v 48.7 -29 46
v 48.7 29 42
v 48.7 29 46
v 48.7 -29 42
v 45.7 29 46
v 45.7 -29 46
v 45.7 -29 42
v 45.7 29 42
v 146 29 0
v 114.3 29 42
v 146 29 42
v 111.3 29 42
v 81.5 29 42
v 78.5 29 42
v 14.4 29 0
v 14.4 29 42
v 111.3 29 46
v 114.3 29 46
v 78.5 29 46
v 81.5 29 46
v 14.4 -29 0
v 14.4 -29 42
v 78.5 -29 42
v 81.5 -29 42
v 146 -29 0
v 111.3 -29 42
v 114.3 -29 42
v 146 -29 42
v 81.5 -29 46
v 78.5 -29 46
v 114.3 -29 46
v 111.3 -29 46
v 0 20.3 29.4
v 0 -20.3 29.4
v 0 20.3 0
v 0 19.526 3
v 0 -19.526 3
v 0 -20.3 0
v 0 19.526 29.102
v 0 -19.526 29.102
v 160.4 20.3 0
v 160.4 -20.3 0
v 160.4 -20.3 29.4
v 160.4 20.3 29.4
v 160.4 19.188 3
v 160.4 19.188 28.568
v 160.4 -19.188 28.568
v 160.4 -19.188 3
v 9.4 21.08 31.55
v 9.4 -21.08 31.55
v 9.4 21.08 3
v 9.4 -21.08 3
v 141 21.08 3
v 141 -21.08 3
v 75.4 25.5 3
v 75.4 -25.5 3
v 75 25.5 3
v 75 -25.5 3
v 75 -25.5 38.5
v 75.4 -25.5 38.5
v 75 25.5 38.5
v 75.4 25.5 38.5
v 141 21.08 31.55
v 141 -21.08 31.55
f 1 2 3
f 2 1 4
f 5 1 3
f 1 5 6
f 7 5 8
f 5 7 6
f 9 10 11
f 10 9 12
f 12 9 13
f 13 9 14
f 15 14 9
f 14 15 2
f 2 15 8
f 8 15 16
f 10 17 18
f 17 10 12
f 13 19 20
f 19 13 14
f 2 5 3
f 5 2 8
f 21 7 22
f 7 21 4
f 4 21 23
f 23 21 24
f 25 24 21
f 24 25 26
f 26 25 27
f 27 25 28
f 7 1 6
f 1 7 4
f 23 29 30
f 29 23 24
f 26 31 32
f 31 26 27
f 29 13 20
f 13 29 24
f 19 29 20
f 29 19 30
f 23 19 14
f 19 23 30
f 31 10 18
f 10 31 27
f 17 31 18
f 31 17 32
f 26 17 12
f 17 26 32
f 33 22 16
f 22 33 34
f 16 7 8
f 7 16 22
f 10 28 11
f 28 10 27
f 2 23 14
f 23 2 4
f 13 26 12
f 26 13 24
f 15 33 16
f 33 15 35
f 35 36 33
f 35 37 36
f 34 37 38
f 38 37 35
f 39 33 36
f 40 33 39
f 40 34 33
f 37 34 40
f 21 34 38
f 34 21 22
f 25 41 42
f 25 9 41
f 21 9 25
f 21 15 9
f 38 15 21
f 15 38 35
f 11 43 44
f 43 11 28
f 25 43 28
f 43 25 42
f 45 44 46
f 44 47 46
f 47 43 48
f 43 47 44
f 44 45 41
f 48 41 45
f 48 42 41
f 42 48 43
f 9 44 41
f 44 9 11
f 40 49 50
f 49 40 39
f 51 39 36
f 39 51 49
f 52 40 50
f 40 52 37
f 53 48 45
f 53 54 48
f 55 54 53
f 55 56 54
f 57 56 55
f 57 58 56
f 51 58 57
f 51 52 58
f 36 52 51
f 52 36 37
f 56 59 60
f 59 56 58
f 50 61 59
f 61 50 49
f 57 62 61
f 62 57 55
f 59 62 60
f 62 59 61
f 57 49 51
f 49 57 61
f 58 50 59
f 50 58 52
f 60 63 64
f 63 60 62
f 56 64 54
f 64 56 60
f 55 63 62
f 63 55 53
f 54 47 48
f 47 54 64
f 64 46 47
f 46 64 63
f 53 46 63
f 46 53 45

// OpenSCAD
$fn = 32;

// ----------------------------------------------------------------------
// Faired channel: 160 x 58 x 42 mm, 3.5 mm walls, faired ends
// ----------------------------------------------------------------------

// --- parameters (mm) ---
length = 160;             // channel length
width = 58;               // channel width at mid length
height = 42;              // channel height at mid length
wall = 3.5;               // side wall thickness
floor_t = 3;              // floor thickness
end_w = 40.6;             // faired end width
end_h = 29.4;             // faired end height
ribs = 3;                 // stiffening ribs on the top
rib_t = 3;                // rib thickness
rib_h = 4;                // rib height

difference() {
  union() {
    hull() {
      translate([0, -20.3, 0]) cube([0.4, 40.6, 29.4]);
      translate([14.4, -29, 0]) cube([0.4, 58, 42]);
    }
    hull() {
      translate([14.4, -29, 0]) cube([0.4, 58, 42]);
      translate([80, -29, 0]) cube([0.4, 58, 42]);
    }
    hull() {
      translate([80, -29, 0]) cube([0.4, 58, 42]);
      translate([145.6, -29, 0]) cube([0.4, 58, 42]);
    }
    hull() {
      translate([145.6, -29, 0]) cube([0.4, 58, 42]);
      translate([160, -20.3, 0]) cube([0.4, 40.6, 29.4]);
    }
    /* stiffening ribs across the flat top, sunk 0.8 mm into it */
    for (i = [1 : ribs]) {
      translate([14.4 + i * (length - 2 * 14.4) / (ribs + 1) - rib_t / 2, -width / 2, height - 0.8]) cube([rib_t, width, rib_h + 0.8]);
    }
  }
  /* cavity, 5 mm proud of both ends so the ports are cut clean */
  hull() {
    translate([-5, -18.7, 3]) cube([0.4, 37.4, 24.8]);
    translate([9.4, -21.08, 3]) cube([0.4, 42.16, 28.55]);
  }
  hull() {
    translate([9.4, -21.08, 3]) cube([0.4, 42.16, 28.55]);
    translate([75, -25.5, 3]) cube([0.4, 51, 35.5]);
  }
  hull() {
    translate([75, -25.5, 3]) cube([0.4, 51, 35.5]);
    translate([140.6, -21.08, 3]) cube([0.4, 42.16, 28.55]);
  }
  hull() {
    translate([140.6, -21.08, 3]) cube([0.4, 42.16, 28.55]);
    translate([165, -18.7, 3]) cube([0.4, 37.4, 24.8]);
  }
}
